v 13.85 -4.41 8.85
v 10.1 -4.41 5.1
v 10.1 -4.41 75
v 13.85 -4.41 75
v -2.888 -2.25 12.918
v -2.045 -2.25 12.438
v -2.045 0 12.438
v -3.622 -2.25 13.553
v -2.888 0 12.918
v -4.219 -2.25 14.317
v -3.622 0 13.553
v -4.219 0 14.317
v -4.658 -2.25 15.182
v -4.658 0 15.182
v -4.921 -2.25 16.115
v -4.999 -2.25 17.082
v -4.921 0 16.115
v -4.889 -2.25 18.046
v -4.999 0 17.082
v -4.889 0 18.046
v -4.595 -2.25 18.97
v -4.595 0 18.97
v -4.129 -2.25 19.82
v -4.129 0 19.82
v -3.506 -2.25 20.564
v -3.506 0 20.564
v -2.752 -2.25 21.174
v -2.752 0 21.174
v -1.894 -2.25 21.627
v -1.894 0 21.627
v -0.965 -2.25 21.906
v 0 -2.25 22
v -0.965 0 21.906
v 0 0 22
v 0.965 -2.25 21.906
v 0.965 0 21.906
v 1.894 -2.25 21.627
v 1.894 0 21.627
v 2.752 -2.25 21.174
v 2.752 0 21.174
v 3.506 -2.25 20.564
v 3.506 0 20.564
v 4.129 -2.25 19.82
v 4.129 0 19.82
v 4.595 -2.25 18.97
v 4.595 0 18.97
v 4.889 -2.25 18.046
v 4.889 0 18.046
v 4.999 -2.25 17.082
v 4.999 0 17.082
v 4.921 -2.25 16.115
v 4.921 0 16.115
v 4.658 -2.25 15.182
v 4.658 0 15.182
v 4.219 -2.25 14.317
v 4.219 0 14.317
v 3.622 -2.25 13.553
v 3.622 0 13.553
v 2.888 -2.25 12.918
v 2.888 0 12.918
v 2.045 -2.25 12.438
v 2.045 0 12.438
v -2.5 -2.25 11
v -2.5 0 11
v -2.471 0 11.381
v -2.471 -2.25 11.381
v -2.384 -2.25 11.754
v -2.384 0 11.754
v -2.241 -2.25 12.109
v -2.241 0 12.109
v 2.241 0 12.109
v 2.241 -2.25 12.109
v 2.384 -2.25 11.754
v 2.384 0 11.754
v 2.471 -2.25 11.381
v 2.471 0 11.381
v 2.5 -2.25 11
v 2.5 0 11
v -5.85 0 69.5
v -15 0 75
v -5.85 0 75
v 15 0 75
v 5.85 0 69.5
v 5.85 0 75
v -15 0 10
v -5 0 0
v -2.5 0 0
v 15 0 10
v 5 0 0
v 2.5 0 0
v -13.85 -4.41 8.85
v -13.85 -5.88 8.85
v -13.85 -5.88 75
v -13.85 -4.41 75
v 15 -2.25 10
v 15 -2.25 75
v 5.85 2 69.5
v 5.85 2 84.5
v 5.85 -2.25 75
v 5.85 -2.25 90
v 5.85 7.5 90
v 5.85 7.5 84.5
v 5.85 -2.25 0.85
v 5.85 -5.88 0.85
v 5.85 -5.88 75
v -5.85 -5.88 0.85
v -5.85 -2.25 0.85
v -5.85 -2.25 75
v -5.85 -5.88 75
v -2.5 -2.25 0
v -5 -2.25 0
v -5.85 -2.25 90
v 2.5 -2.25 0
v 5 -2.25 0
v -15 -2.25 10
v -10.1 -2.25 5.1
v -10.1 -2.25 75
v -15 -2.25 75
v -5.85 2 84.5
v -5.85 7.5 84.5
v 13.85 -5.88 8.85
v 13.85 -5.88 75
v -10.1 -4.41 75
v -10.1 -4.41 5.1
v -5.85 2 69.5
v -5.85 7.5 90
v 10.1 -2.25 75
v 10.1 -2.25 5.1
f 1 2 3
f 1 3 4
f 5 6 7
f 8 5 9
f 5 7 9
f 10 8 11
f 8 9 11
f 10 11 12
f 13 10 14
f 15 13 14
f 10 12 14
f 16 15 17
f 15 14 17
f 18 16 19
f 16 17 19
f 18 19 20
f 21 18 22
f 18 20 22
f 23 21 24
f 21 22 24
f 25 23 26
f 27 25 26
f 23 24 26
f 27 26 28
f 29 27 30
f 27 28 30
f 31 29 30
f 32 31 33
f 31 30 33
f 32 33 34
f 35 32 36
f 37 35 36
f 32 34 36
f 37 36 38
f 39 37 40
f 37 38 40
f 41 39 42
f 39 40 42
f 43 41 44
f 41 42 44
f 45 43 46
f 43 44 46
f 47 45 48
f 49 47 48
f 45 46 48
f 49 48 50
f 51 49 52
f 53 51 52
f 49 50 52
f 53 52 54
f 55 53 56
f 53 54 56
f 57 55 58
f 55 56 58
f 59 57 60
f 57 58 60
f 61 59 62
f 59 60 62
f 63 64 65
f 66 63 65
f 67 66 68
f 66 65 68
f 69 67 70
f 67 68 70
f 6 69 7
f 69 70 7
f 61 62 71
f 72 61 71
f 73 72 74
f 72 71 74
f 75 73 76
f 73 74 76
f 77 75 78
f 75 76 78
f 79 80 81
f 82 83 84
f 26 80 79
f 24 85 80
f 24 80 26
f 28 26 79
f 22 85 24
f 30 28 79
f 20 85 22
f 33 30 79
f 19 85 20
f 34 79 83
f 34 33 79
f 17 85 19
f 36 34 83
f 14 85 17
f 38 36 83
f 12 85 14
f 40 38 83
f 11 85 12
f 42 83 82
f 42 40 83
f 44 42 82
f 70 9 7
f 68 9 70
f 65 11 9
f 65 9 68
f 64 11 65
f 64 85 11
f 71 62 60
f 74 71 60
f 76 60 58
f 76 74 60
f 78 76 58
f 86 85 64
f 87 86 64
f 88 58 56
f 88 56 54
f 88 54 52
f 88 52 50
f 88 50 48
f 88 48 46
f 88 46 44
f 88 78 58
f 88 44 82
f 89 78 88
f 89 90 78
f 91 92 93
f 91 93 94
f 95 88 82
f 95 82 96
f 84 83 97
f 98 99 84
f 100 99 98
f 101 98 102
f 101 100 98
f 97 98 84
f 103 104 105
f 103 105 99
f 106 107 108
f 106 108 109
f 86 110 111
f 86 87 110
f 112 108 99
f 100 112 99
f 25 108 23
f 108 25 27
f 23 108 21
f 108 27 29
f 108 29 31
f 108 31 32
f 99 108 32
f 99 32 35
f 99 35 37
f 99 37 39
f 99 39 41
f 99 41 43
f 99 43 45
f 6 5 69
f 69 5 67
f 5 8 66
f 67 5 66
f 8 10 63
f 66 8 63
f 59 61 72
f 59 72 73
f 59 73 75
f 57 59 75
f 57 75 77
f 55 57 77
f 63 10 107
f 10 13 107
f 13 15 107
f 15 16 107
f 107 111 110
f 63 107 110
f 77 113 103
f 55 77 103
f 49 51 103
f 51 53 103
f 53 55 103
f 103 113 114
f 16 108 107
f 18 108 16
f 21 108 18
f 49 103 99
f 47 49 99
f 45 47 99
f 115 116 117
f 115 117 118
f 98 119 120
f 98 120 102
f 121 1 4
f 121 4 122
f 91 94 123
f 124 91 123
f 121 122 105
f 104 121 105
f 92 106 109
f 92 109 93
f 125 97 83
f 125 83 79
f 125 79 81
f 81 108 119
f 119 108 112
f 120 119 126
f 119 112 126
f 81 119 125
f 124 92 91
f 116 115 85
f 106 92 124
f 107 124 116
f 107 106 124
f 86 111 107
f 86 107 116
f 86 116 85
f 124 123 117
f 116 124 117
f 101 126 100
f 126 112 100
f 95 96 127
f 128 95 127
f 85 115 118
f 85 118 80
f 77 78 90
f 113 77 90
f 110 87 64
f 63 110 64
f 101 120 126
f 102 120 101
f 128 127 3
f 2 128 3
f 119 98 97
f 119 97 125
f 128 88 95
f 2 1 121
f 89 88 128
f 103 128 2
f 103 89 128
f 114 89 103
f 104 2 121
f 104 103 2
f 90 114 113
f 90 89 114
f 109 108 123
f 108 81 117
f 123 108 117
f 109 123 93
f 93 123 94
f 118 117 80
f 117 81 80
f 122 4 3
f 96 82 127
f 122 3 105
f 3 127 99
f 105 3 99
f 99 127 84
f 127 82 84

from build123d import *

# Parameters (mm, degrees)
BOSS_EXTRUDE1_DEPTH = 75
CUT_EXTRUDE1_DEPTH  = 2.25
SKETCH3_W           = 11.7
SKETCH3_H           = 2.25
BOSS_EXTRUDE2_DEPTH = 15
SKETCH4_W           = 11.7
SKETCH4_H           = 5.5
BOSS_EXTRUDE3_DEPTH = 7.5
SKETCH5_W           = 11.7
SKETCH5_H           = 2
BOSS_EXTRUDE4_DEPTH = 15
SKETCH6_R           = 5
CUT_EXTRUDE2_DEPTH  = 2.25
CHAMFER1_SIZE       = 10
CHAMFER2_SIZE       = 10


with BuildPart() as part:
    # Sketch1 → Boss-Extrude1 (new body)
    with BuildSketch(Plane.XY):
        Polygon((-15, 0), (15, 0), (15, -2.25), (10.1, -2.25), (10.1, -4.41), (13.85, -4.41), (13.85, -5.88), (5.85, -5.88), (5.85, -2.25), (-5.85, -2.25), (-5.85, -5.88), (-13.85, -5.88), (-13.85, -4.41), (-10.1, -4.41), (-10.1, -2.25), (-15, -2.25), align=None)
    extrude(amount=BOSS_EXTRUDE1_DEPTH)

    # Sketch2 → Cut-Extrude1 (cut)
    with BuildSketch(Plane(origin=(0, 0, 0), x_dir=(1, 0, 0), z_dir=(0, 1, 0))):
        with BuildLine():
            Line((2.5, -11), (2.5, 0))
            Line((2.5, 0), (-2.5, 0))
            Line((-2.5, 0), (-2.5, -11))
            ThreePointArc((-2.5, -11), (0, -13.5), (2.5, -11))
        make_face()
    extrude(amount=-CUT_EXTRUDE1_DEPTH, mode=Mode.SUBTRACT)

    # Sketch3 → Boss-Extrude2 (add)
    with BuildSketch(Plane.XY.offset(75)):
        with Locations((0, -1.125)):
            Rectangle(SKETCH3_W, SKETCH3_H)
    extrude(amount=BOSS_EXTRUDE2_DEPTH)

    # Sketch4 → Boss-Extrude3 (add)
    with BuildSketch(Plane(origin=(0, 0, 0), x_dir=(1, 0, 0), z_dir=(0, 1, 0))):
        with Locations((0, -87.25)):
            Rectangle(SKETCH4_W, SKETCH4_H)
    extrude(amount=BOSS_EXTRUDE3_DEPTH)

    # Sketch5 → Boss-Extrude4 (add)
    with BuildSketch(Plane(origin=(0, 0, 84.5), x_dir=(-1, 0, 0), z_dir=(0, 0, -1))):
        with Locations((0, 1)):
            Rectangle(SKETCH5_W, SKETCH5_H)
    extrude(amount=BOSS_EXTRUDE4_DEPTH)

    # Sketch6 → Cut-Extrude2 (cut)
    with BuildSketch(Plane(origin=(0, 0, 0), x_dir=(1, 0, 0), z_dir=(0, 1, 0))):
        with Locations((0, -17)):
            Circle(SKETCH6_R)
    extrude(amount=-CUT_EXTRUDE2_DEPTH, mode=Mode.SUBTRACT)

    # Chamfer1
    chamfer1_edges = [part.edges().sort_by_distance(p)[0] for p in [
        (15, -1.125, 0),
    ]]
    chamfer(chamfer1_edges, length=CHAMFER1_SIZE)

    # Chamfer2
    chamfer2_edges = [part.edges().sort_by_distance(p)[0] for p in [
        (-15, -1.125, 0),
    ]]
    chamfer(chamfer2_edges, length=CHAMFER2_SIZE)


solid = part.part
